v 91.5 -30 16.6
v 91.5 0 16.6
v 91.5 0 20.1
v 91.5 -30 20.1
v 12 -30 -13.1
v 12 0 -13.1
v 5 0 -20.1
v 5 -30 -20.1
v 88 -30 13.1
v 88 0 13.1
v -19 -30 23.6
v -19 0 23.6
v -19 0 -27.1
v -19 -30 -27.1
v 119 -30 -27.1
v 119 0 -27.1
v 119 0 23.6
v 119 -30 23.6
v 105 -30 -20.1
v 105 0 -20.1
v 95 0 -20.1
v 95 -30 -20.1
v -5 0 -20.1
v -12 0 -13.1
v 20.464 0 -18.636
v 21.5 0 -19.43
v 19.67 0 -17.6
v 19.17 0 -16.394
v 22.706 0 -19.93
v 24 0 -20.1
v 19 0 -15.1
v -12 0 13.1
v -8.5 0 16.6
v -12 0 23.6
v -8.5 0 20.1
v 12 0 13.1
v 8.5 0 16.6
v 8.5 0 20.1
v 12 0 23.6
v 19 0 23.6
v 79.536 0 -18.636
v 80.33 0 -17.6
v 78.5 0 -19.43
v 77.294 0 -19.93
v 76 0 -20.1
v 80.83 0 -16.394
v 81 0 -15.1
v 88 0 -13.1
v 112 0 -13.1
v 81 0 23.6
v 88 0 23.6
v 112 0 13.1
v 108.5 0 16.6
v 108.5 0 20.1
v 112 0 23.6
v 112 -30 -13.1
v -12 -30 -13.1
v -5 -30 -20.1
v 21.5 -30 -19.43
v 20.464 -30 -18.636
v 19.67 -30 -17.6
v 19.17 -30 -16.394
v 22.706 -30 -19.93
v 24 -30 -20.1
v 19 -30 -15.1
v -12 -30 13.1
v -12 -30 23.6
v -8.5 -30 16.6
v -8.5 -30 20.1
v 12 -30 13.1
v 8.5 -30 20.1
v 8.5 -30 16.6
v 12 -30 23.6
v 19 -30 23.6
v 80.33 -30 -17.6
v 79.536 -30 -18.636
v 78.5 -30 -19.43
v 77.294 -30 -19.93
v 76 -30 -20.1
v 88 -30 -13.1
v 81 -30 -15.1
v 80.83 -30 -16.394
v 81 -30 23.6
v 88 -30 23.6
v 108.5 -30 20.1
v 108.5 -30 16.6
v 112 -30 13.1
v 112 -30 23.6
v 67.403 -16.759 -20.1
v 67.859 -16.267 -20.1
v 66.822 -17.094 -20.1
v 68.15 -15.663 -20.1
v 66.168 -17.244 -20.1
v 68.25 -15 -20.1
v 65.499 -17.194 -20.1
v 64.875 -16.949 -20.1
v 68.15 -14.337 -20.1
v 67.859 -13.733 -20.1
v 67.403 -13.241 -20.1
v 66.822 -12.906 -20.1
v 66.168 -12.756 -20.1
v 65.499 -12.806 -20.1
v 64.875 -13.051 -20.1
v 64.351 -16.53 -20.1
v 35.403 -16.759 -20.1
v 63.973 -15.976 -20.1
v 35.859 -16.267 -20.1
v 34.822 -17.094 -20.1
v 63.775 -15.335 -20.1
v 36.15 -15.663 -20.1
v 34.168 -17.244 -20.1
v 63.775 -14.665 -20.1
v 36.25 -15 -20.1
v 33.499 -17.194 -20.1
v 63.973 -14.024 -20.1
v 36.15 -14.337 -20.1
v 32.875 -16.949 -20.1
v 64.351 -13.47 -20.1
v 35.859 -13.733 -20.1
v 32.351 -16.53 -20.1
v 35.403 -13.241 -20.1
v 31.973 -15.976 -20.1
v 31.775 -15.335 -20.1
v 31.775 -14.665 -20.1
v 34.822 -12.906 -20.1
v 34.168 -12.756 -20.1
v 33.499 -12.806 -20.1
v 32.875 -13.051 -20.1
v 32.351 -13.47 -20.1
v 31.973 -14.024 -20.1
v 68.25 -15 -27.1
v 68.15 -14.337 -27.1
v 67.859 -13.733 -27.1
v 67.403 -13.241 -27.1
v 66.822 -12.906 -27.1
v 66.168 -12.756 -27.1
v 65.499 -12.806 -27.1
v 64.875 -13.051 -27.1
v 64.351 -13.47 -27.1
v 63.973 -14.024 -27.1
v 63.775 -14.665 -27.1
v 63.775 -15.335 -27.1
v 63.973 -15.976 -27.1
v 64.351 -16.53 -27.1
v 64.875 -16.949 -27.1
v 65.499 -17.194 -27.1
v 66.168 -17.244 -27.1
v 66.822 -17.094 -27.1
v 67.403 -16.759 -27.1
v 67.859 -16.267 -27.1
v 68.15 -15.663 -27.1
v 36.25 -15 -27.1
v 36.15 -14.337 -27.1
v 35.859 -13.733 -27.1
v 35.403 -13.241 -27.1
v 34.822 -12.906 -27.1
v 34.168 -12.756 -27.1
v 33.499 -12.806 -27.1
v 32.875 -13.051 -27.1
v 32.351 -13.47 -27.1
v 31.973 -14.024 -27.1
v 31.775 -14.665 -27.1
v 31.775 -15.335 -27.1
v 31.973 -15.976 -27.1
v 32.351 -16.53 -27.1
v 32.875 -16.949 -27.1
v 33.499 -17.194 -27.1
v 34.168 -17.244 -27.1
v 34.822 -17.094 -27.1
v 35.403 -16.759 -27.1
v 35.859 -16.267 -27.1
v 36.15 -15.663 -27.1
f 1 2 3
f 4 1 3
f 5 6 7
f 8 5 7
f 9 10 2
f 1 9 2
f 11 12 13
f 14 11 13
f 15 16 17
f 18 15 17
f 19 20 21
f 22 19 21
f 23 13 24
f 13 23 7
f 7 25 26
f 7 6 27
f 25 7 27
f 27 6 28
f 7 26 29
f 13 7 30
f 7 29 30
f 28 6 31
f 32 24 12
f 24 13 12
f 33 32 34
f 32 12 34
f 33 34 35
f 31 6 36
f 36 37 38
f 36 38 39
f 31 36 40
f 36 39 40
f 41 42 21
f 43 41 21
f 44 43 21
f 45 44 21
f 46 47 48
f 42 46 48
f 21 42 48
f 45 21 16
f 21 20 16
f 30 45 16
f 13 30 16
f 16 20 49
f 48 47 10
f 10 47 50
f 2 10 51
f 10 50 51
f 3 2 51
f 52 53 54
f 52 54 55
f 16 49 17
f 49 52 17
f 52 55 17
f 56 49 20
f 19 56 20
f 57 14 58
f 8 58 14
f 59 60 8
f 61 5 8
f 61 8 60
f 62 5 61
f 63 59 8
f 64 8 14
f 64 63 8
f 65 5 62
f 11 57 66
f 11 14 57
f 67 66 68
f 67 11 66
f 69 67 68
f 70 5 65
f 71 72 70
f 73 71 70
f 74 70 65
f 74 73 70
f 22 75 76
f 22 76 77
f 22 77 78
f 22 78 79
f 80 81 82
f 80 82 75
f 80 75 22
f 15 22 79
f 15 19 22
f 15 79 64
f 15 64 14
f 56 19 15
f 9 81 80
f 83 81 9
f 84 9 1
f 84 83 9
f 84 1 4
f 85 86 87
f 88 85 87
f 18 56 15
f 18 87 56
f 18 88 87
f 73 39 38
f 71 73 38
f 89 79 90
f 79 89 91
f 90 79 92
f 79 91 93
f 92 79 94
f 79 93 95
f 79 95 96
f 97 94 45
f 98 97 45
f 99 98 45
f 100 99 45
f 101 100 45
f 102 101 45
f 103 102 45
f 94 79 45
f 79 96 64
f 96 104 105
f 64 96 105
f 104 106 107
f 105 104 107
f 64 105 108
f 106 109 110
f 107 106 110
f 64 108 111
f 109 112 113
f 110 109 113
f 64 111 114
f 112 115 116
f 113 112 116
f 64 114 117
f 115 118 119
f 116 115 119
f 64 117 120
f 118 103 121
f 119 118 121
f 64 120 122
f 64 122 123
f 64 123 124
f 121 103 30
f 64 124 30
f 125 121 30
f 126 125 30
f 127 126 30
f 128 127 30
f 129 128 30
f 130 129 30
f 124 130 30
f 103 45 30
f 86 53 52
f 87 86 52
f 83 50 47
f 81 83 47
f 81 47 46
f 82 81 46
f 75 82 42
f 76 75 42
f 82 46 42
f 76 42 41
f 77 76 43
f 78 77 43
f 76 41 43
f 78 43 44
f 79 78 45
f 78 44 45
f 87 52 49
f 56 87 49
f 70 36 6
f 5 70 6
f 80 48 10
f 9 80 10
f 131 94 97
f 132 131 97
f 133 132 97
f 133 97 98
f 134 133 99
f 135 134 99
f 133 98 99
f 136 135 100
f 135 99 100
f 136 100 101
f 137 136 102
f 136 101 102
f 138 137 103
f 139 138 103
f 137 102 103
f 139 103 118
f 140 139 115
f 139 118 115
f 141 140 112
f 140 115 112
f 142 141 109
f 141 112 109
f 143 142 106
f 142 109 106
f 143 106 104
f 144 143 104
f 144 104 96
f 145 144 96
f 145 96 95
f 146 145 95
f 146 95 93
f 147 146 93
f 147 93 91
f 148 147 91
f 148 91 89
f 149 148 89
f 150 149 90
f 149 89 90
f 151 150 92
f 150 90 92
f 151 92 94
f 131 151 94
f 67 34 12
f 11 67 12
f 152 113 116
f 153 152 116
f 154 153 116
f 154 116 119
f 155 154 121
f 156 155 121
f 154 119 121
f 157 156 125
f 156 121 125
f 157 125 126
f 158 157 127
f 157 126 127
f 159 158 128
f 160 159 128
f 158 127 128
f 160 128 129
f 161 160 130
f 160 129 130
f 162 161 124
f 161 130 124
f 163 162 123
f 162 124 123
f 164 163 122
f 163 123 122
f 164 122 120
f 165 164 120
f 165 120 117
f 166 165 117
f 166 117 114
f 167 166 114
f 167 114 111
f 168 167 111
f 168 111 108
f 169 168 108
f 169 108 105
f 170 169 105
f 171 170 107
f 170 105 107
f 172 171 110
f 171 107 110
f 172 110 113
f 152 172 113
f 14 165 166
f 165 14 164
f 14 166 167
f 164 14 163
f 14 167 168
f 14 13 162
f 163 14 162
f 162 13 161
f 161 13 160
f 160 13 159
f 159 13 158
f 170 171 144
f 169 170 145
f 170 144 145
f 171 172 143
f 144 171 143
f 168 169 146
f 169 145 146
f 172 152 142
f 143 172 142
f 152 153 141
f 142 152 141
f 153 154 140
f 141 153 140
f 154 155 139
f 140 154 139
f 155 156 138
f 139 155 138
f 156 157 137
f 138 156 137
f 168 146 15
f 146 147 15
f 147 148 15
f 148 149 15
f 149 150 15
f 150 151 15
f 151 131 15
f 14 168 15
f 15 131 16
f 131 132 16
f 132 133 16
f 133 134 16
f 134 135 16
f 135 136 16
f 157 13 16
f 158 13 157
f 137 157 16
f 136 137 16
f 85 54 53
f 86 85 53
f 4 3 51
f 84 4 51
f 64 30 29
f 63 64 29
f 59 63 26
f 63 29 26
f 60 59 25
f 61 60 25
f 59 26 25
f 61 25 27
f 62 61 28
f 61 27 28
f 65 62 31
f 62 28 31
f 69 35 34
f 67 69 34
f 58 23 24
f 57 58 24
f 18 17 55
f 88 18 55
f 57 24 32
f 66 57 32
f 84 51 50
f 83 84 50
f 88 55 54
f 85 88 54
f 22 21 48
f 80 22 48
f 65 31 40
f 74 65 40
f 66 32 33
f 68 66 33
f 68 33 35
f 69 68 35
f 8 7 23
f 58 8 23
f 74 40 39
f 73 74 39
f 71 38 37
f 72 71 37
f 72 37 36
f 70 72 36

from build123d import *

# Parameters (mm, degrees)
F1_DEPTH = 30
F2_R     = 2.25
F3_DEPTH = 7


with BuildPart() as f1:
    # F0 (on Front) → F1 (new body)
    with BuildSketch(Plane.XZ):
        with BuildLine():
            Line((-12, -13.1), (-12, 13.1))
            Line((-12, 13.1), (-8.5, 16.6))
            Line((-8.5, 16.6), (-8.5, 20.1))
            Line((-8.5, 20.1), (-12, 23.6))
            Line((-12, 23.6), (-19, 23.6))
            Line((-19, 23.6), (-19, -27.1))
            Line((-19, -27.1), (0, -27.1))
            Line((0, -27.1), (19, -27.1))
            Line((19, -27.1), (81, -27.1))
            Line((81, -27.1), (100, -27.1))
            Line((100, -27.1), (119, -27.1))
            Line((119, -27.1), (119, 23.6))
            Line((119, 23.6), (112, 23.6))
            Line((112, 23.6), (108.5, 20.1))
            Line((108.5, 20.1), (108.5, 16.6))
            Line((108.5, 16.6), (112, 13.1))
            Line((112, 13.1), (112, -13.1))
            Line((112, -13.1), (105, -20.1))
            Line((105, -20.1), (95, -20.1))
            Line((95, -20.1), (88, -13.1))
            Line((88, -13.1), (88, 13.1))
            Line((88, 13.1), (91.5, 16.6))
            Line((91.5, 16.6), (91.5, 20.1))
            Line((91.5, 20.1), (88, 23.6))
            Line((88, 23.6), (81, 23.6))
            Line((81, 23.6), (81, -15.1))
            ThreePointArc((81, -15.1), (79.535534, -18.635534), (76, -20.1))
            Line((76, -20.1), (24, -20.1))
            ThreePointArc((24, -20.1), (20.464466, -18.635534), (19, -15.1))
            Line((19, -15.1), (19, 23.6))
            Line((19, 23.6), (12, 23.6))
            Line((12, 23.6), (8.5, 20.1))
            Line((8.5, 20.1), (8.5, 16.6))
            Line((8.5, 16.6), (12, 13.1))
            Line((12, 13.1), (12, -13.1))
            Line((12, -13.1), (5, -20.1))
            Line((5, -20.1), (-5, -20.1))
            Line((-5, -20.1), (-12, -13.1))
        make_face()
    extrude(amount=F1_DEPTH)

    # F2 (on face) → F3 (cut, through all)
    with BuildSketch(Plane.XY.offset(-20.1)):
        with Locations((34, -15)):
            Circle(F2_R)
        with Locations((66, -15)):
            Circle(F2_R)
    extrude(amount=-F3_DEPTH, mode=Mode.SUBTRACT)


solid = f1.part
